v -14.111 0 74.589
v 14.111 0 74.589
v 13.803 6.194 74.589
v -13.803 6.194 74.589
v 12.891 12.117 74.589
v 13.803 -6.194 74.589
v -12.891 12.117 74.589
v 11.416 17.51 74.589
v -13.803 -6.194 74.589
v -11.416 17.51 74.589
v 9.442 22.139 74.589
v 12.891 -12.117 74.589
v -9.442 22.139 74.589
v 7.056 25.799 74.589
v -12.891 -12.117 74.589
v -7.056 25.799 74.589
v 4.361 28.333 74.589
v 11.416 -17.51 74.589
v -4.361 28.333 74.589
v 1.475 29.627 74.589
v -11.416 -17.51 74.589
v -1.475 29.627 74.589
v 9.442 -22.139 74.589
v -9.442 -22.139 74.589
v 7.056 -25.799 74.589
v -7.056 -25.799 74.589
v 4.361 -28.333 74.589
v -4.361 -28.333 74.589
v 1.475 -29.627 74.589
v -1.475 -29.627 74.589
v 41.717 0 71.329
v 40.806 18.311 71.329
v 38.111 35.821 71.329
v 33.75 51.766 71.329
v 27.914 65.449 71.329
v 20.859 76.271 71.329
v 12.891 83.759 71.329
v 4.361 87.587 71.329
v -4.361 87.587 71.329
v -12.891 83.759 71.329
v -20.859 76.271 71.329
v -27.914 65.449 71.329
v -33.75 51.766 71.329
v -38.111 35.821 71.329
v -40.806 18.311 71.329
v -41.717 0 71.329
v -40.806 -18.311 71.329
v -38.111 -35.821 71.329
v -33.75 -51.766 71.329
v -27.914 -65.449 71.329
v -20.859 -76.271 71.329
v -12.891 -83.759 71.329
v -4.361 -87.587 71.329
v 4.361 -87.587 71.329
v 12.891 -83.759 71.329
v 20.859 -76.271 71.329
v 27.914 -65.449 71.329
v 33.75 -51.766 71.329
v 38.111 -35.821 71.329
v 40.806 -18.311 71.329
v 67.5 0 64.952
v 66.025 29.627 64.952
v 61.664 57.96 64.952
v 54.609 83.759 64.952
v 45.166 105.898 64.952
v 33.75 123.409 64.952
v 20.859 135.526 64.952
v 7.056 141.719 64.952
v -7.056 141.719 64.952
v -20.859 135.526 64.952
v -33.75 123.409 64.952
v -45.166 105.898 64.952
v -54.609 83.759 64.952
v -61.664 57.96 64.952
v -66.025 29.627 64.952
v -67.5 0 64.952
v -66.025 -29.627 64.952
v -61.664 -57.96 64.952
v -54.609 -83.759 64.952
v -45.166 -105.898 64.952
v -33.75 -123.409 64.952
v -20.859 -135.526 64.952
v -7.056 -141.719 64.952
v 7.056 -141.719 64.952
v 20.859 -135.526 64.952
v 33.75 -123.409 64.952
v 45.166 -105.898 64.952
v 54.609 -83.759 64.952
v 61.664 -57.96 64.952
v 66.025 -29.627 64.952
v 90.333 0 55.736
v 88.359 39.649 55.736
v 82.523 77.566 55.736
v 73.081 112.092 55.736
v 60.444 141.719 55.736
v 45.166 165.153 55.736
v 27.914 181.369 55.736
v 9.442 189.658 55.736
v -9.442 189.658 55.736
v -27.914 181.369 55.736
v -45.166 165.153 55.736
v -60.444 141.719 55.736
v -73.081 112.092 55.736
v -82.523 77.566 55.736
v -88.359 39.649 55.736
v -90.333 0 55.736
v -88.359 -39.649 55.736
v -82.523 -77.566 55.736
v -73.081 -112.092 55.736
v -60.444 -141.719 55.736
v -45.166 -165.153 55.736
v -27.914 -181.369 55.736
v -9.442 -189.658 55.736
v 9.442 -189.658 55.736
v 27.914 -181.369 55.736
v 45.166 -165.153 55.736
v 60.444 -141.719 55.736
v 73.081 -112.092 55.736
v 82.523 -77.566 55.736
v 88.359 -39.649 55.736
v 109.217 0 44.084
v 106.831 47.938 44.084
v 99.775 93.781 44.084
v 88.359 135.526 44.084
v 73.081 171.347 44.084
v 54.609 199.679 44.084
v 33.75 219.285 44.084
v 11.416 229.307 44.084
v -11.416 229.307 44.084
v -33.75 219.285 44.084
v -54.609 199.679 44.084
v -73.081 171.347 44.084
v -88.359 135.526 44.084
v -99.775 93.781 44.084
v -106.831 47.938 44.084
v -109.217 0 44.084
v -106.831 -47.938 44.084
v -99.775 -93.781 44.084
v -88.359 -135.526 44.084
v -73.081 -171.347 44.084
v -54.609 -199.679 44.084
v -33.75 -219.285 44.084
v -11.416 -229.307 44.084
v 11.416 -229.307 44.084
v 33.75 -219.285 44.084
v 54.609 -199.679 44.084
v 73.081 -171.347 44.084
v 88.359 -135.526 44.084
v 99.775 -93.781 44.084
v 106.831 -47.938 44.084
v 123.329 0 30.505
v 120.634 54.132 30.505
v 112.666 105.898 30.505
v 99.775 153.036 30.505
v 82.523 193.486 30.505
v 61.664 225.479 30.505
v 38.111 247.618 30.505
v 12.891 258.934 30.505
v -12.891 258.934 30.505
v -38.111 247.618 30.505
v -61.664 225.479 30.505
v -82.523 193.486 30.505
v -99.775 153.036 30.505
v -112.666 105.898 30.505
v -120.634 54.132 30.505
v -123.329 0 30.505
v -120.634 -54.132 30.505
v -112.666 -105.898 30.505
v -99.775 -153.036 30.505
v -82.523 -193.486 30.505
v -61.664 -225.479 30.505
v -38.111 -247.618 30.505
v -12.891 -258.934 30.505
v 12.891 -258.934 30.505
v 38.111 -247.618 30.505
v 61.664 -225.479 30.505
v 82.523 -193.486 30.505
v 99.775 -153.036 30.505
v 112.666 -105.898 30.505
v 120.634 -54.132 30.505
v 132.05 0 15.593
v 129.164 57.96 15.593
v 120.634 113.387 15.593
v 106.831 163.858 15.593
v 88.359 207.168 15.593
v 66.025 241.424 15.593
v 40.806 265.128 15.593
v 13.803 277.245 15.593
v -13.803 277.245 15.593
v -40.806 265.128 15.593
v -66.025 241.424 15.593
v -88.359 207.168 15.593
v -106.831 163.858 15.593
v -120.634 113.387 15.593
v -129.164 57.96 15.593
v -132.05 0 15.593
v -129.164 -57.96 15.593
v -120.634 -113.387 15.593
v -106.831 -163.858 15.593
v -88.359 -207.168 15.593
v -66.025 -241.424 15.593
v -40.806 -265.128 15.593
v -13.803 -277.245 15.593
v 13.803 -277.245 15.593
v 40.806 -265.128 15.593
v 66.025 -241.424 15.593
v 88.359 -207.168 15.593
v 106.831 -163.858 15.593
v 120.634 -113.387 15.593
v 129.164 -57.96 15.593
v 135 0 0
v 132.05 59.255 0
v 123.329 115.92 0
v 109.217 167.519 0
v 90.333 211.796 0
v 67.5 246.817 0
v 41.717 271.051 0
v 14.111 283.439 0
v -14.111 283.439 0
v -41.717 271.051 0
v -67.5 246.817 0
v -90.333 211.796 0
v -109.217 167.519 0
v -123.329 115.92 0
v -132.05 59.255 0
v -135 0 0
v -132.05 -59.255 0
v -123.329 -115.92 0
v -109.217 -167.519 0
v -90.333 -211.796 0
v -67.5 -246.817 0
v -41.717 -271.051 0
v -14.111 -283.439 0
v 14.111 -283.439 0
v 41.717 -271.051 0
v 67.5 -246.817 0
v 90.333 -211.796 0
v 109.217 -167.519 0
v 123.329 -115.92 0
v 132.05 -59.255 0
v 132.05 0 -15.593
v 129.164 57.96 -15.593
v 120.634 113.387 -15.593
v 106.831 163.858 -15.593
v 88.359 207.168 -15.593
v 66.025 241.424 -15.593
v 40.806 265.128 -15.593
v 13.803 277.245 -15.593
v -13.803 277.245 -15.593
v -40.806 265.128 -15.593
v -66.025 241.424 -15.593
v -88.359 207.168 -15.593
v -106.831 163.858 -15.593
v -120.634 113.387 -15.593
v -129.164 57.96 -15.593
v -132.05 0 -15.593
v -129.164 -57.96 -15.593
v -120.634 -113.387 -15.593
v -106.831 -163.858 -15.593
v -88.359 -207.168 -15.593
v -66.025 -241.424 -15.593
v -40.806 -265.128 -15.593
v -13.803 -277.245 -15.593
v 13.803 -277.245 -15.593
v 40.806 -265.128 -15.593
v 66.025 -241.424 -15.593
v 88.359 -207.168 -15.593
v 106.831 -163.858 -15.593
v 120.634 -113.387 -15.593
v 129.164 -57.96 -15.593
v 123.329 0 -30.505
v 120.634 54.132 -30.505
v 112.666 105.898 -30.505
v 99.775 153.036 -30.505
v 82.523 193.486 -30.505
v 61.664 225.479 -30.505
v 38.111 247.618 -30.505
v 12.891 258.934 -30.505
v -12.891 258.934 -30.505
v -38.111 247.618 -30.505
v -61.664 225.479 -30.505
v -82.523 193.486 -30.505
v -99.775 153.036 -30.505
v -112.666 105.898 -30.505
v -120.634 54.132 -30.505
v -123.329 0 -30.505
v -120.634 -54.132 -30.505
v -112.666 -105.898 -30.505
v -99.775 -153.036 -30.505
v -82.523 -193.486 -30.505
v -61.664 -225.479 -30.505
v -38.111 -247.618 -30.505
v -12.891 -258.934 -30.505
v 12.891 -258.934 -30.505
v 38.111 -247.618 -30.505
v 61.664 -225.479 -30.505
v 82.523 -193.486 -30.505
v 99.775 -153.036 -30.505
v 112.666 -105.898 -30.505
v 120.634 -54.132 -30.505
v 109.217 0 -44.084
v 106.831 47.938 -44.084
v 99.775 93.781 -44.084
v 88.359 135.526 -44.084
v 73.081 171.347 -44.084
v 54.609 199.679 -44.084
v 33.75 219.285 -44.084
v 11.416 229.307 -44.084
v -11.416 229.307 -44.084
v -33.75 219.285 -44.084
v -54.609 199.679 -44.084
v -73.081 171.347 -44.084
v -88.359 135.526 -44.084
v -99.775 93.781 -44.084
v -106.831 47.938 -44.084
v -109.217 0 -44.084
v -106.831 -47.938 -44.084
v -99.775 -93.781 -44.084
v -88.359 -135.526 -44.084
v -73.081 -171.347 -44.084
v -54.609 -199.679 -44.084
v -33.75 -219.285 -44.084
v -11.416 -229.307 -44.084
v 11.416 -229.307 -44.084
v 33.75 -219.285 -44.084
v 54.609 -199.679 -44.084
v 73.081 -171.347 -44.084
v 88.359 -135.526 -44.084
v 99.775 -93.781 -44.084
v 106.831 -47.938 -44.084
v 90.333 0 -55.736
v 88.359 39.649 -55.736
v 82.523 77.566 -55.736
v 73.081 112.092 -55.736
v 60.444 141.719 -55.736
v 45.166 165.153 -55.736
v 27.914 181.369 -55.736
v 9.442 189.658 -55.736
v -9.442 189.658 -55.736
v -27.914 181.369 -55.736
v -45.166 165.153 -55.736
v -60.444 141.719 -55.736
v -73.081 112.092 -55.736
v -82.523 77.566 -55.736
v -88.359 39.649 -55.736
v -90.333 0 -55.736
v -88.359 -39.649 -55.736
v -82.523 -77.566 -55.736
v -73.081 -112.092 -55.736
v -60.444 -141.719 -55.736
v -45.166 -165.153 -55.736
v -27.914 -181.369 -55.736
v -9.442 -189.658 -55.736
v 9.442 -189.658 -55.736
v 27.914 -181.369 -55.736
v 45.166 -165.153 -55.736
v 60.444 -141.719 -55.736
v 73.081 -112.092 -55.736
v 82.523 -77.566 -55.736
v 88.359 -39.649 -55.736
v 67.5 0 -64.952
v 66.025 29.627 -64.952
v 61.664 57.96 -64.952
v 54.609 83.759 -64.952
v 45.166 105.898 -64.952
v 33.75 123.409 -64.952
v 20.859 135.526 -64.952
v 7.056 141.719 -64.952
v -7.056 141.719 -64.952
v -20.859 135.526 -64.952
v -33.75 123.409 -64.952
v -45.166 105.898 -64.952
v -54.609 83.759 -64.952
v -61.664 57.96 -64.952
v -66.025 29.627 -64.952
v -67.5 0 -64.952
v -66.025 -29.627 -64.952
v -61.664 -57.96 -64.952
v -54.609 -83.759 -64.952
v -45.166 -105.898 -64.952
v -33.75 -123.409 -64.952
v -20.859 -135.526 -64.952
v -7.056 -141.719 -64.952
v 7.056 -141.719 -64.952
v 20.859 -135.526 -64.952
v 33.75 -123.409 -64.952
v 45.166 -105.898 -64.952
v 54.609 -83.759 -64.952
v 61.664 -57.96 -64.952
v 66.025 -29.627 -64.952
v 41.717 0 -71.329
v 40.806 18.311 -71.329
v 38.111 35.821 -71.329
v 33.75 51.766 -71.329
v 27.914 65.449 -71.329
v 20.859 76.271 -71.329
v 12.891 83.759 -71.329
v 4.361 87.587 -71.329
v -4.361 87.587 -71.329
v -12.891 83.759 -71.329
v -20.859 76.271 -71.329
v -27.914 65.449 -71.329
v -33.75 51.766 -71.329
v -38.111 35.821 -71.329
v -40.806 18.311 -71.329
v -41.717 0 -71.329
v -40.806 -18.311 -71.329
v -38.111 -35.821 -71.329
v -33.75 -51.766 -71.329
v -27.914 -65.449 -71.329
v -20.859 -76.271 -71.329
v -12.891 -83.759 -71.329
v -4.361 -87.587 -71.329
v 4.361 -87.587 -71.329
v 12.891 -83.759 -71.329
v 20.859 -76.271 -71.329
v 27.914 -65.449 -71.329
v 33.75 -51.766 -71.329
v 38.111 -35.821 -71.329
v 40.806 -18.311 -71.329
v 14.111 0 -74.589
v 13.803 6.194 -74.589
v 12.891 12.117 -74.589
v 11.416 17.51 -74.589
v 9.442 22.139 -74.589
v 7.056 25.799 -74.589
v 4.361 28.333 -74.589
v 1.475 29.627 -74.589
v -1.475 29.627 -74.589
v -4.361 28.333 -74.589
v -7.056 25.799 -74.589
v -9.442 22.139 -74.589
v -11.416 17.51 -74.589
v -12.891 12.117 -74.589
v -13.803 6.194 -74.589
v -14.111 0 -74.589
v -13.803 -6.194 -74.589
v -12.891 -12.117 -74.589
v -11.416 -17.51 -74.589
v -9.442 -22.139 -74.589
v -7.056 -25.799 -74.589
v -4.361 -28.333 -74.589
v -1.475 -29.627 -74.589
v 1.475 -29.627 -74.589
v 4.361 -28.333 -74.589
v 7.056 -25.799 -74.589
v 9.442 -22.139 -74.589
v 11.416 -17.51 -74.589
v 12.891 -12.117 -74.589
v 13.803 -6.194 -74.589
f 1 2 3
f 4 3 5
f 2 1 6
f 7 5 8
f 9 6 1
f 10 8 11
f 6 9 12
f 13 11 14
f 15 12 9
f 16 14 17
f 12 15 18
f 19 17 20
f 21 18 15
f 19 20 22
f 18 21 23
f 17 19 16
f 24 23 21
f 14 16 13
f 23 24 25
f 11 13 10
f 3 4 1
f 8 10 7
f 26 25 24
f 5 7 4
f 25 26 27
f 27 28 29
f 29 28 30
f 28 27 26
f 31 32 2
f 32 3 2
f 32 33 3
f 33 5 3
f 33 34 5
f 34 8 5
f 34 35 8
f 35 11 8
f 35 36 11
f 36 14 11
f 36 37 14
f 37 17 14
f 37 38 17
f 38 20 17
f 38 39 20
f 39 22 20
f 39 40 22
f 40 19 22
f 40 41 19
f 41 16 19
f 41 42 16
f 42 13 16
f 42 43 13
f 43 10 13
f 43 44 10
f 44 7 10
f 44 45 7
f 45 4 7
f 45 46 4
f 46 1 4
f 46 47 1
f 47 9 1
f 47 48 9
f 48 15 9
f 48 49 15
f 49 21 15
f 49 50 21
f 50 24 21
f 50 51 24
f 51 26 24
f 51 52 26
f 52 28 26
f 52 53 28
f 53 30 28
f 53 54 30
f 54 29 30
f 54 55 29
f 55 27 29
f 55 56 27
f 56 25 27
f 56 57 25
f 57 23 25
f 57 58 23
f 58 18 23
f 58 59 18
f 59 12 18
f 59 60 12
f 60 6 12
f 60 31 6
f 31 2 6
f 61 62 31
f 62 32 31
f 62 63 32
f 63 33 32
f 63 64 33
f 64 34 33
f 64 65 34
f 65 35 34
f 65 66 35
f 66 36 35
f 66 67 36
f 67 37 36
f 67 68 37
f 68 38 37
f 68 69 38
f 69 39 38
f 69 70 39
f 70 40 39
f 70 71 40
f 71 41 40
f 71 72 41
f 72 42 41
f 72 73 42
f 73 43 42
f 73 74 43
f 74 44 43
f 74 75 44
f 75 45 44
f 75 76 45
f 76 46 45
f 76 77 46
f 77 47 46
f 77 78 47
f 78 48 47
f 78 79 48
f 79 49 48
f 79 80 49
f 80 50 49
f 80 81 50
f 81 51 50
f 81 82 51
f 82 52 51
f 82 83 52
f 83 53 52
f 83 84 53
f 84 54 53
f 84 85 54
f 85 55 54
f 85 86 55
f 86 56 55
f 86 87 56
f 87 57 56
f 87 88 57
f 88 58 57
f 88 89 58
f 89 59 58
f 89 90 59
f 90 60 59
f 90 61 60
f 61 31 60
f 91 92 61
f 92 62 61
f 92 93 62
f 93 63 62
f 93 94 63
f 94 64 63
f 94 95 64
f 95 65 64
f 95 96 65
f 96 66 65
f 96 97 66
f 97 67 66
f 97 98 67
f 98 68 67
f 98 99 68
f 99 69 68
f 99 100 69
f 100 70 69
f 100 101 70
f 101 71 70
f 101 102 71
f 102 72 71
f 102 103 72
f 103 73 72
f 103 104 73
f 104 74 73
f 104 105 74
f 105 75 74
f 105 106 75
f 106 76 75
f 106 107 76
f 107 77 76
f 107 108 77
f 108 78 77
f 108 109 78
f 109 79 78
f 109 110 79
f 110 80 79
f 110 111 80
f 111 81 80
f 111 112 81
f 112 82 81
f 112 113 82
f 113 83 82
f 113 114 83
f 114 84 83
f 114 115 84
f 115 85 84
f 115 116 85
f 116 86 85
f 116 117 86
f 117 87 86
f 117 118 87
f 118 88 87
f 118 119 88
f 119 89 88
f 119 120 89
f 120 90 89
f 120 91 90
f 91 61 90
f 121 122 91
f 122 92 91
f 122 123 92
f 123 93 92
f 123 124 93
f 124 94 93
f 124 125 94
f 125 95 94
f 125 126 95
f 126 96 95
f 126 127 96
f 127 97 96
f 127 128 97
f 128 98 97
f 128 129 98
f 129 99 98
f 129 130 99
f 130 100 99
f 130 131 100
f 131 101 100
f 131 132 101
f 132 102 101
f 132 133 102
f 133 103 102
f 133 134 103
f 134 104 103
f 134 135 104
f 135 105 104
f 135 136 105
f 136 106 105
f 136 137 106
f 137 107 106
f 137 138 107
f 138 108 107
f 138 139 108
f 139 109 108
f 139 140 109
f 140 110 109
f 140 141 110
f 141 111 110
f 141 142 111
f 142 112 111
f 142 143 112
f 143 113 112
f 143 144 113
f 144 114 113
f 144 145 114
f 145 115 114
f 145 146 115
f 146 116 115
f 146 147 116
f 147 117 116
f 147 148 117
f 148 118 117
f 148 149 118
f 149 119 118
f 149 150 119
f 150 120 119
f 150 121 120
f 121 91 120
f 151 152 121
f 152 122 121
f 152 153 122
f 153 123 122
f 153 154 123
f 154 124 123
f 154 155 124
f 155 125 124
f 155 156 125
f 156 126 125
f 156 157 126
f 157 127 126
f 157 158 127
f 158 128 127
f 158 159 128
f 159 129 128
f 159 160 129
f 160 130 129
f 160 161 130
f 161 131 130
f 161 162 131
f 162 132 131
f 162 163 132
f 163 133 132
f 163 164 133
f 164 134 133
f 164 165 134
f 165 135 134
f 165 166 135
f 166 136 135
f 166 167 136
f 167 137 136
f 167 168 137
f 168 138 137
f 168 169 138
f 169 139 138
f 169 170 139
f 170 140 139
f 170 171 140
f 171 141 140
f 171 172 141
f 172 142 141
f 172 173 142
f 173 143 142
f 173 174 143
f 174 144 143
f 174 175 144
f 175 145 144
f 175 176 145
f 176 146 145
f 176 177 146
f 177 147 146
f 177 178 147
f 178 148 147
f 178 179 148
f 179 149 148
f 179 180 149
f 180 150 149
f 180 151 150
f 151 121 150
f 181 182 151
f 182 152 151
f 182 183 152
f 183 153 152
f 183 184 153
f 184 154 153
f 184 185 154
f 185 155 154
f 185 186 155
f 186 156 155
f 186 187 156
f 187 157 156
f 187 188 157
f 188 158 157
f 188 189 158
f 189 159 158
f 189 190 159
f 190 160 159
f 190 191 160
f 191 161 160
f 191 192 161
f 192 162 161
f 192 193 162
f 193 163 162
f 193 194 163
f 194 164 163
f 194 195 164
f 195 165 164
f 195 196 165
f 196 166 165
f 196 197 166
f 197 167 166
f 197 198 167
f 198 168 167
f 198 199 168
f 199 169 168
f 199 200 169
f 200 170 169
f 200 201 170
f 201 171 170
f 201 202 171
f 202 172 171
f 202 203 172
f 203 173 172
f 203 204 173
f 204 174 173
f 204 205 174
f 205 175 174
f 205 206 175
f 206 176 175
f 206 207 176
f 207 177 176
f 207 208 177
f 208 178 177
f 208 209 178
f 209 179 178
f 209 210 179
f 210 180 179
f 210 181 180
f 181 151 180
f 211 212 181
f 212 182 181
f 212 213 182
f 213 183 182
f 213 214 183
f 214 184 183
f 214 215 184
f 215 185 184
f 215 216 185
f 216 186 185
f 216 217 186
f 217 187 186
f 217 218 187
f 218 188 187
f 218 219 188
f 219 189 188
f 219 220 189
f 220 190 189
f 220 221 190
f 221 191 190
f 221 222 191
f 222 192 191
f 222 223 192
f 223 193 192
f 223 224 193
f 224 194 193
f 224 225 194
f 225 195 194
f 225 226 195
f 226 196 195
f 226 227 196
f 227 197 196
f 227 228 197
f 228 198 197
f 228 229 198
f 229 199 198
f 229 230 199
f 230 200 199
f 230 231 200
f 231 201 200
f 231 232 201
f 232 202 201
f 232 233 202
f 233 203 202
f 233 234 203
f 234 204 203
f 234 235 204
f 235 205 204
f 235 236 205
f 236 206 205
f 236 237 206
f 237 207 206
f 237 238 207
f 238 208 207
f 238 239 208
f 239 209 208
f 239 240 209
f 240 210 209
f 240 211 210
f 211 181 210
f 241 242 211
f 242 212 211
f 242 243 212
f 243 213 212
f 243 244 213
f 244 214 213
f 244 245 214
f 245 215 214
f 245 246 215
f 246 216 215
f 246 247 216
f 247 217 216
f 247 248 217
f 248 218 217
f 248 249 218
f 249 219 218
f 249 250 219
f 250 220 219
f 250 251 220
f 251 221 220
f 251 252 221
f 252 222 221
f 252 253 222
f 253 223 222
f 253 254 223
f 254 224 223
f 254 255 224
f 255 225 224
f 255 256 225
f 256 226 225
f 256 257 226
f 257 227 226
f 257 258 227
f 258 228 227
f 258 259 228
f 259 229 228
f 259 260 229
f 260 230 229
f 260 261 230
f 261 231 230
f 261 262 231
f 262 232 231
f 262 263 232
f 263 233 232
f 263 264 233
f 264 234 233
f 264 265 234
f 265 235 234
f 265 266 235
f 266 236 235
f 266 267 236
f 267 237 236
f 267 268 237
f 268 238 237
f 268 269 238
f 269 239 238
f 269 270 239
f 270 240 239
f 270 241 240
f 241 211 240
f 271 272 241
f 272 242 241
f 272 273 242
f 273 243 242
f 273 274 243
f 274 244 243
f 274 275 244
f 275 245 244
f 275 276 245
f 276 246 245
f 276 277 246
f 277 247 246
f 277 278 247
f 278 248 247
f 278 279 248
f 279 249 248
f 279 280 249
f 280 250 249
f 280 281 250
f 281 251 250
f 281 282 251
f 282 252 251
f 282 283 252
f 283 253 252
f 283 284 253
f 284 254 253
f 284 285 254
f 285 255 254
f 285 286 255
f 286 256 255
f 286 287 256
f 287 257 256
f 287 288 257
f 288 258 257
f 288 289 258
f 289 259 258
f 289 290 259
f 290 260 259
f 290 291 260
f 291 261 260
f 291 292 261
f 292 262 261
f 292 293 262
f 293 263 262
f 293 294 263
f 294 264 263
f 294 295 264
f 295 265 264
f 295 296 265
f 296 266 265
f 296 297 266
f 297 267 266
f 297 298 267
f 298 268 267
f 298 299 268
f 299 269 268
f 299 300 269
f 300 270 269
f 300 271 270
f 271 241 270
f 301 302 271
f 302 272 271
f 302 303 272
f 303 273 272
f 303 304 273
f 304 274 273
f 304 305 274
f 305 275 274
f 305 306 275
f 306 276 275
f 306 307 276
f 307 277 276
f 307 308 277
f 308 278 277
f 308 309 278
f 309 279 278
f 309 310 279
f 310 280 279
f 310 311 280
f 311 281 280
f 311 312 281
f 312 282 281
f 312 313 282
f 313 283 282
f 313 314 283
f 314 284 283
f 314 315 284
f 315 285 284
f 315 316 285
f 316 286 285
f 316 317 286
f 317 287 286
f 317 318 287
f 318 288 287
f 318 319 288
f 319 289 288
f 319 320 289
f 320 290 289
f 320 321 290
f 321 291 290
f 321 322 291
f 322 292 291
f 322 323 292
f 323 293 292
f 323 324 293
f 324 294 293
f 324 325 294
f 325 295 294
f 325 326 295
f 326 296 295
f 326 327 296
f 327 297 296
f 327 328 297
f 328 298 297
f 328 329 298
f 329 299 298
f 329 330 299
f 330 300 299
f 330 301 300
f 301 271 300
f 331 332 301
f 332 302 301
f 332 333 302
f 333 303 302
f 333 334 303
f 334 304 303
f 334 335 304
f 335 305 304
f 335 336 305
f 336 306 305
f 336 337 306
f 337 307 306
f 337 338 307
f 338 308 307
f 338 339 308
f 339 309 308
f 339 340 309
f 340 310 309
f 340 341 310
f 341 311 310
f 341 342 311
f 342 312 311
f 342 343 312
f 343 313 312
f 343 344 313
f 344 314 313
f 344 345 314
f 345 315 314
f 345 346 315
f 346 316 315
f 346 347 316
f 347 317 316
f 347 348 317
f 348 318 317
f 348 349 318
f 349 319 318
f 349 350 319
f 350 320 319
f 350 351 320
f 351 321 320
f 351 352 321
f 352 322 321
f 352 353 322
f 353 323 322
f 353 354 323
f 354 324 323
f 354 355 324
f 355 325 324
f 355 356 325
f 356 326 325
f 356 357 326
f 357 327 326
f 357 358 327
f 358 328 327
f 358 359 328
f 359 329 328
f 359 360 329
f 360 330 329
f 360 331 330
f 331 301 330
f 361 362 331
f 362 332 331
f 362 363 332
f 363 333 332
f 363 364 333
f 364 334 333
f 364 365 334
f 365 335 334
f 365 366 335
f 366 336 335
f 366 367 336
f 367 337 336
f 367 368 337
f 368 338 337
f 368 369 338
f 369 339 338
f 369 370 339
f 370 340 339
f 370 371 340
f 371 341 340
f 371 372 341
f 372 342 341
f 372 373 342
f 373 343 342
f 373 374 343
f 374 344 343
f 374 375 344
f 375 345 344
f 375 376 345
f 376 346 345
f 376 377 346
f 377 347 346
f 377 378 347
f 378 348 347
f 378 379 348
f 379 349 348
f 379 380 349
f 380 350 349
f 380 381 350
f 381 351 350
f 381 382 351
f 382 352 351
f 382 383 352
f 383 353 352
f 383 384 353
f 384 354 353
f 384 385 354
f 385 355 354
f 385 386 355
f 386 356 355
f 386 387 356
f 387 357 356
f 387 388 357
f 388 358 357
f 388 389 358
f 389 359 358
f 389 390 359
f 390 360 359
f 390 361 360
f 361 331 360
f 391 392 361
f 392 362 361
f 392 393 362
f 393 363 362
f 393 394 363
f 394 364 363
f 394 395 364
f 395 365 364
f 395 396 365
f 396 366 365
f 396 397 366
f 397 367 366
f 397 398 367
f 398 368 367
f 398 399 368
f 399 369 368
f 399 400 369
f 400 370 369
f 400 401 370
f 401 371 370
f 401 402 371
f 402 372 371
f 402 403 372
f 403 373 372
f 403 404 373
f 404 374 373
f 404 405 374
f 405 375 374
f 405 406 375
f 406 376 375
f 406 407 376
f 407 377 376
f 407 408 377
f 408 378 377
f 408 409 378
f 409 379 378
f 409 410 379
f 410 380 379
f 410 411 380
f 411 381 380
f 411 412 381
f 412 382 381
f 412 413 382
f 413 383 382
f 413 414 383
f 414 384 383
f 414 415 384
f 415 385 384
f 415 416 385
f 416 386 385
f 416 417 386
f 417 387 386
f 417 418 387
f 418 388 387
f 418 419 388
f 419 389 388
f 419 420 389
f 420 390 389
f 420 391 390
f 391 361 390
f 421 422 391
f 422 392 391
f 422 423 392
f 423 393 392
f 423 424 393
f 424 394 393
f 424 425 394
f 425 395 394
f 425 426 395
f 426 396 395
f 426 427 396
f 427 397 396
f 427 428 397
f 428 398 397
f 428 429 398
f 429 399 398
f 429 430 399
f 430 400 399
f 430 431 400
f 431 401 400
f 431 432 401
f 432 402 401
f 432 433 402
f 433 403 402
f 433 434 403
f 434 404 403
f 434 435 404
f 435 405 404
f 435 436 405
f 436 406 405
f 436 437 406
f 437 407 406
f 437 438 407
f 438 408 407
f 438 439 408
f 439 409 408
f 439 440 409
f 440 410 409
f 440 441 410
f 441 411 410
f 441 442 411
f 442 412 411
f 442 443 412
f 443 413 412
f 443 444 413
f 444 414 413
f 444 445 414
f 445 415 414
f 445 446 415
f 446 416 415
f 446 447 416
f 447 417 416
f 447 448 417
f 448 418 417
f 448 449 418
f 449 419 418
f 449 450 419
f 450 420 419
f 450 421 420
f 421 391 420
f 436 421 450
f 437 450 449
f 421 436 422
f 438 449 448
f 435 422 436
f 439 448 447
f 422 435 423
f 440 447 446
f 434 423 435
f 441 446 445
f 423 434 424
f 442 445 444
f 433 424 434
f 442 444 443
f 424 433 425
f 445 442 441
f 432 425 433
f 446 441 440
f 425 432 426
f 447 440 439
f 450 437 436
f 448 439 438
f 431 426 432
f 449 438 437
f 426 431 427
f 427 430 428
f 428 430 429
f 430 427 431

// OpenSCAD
// Generated by SolidPython 1.0.1 on 2020-07-29 00:46:49


scale(v = [9, 19, 5]) {
	sphere(r = 15);
}
/***********************************************
*********      SolidPython code:      **********
************************************************
 
# import packages: SolidPython
from solid import *
from solid.utils import *
from itertools import chain, combinations, permutations


class Resize:

    def __init__(self, scad_file):
        self.scad_file = scad_file
        #self.scad_file = import_scad(scad_file)
        # cone/cylinder param:
        self.r1 = 0
        self.r2 = 0
        self.h = 0
        # rectangular prism param:
        self.w = 0
        self.l = 0
        # ellipse param:
        self.r = 0

    # import OpenScad code (file name corresponds to shape)


    # classify shape + parameters
    def assign(self, param1, param2, param3):
        if self.scad_file == 'cone.scad':
            self.r1 = param1
            self.r2 = param2
            self.h = param3
        elif self.scad_file == 'cylinder.scad':
            self.r1 = param1
            self.r2 = param2
            self.h = param3
        elif self.scad_file == 'rectangularPrism.scad':
            self.h = param1
            self.l = param2
            self.w = param3
        else:
            self.r = param1
            self.h = param2

    # resize parameters
    def iterate(self):
        x = range(3, 20, 2)
        i = 1
        if self.scad_file == 'cone.scad':
            tempList = list(permutations(x, 2))
            for temp in tempList:
                param1 = temp[0]
                param2 = temp[1]
                filepath = 'produced_scad_files/' + 'cone' + str(param1) + '_' + str(param2) + '_' + '.scad'
                scad_render_to_file(cylinder(h=param1, r1=param2, r2=0), filepath)

        elif self.scad_file == 'cylinder.scad':
            tempList = list(permutations(x, 3))
            for temp in tempList:
                param1 = temp[0]
                param2 = temp[1]
                filepath = 'produced_scad_files/' + 'cylinder' + str(param1) + '_' + str(param2) + '_' + '.scad'
                scad_render_to_file(cylinder(h=param1, r1=param2, r2=param2), filepath)

        elif self.scad_file == 'rectangularPrism.scad':
            tempList = list(permutations(x, 3))
            for temp in tempList:
                param1 = temp[0]
                param2 = temp[1]
                param3 = temp[2]
                filepath = 'produced_scad_files/' + 'rectangularPrism' + str(param1) + '_' + str(param2) + '_' + str(
                    param3) + '.scad'
                scad_render_to_file(cube(size=(param1, param2, param3)), filepath)

        elif self.scad_file == 'ellipse.scad':
            tempList = list(permutations(x, 4))
            for temp in tempList:
                param1 = temp[0]
                param2 = temp[1]
                param3 = temp[2]
                param4 = temp[3]
                filepath = 'produced_scad_files/' + 'ellipse' + str(param1) + '_' + str(param2) + '_' + str(param3) + '_' + str(param4) + '.scad'
                scad_render_to_file(scale([param1, param2, param3])(sphere(r=param4)), filepath)

    def render_to_scadfile(self):
        scad_render_to_file(scad, 'example.scad') 
 
************************************************/
